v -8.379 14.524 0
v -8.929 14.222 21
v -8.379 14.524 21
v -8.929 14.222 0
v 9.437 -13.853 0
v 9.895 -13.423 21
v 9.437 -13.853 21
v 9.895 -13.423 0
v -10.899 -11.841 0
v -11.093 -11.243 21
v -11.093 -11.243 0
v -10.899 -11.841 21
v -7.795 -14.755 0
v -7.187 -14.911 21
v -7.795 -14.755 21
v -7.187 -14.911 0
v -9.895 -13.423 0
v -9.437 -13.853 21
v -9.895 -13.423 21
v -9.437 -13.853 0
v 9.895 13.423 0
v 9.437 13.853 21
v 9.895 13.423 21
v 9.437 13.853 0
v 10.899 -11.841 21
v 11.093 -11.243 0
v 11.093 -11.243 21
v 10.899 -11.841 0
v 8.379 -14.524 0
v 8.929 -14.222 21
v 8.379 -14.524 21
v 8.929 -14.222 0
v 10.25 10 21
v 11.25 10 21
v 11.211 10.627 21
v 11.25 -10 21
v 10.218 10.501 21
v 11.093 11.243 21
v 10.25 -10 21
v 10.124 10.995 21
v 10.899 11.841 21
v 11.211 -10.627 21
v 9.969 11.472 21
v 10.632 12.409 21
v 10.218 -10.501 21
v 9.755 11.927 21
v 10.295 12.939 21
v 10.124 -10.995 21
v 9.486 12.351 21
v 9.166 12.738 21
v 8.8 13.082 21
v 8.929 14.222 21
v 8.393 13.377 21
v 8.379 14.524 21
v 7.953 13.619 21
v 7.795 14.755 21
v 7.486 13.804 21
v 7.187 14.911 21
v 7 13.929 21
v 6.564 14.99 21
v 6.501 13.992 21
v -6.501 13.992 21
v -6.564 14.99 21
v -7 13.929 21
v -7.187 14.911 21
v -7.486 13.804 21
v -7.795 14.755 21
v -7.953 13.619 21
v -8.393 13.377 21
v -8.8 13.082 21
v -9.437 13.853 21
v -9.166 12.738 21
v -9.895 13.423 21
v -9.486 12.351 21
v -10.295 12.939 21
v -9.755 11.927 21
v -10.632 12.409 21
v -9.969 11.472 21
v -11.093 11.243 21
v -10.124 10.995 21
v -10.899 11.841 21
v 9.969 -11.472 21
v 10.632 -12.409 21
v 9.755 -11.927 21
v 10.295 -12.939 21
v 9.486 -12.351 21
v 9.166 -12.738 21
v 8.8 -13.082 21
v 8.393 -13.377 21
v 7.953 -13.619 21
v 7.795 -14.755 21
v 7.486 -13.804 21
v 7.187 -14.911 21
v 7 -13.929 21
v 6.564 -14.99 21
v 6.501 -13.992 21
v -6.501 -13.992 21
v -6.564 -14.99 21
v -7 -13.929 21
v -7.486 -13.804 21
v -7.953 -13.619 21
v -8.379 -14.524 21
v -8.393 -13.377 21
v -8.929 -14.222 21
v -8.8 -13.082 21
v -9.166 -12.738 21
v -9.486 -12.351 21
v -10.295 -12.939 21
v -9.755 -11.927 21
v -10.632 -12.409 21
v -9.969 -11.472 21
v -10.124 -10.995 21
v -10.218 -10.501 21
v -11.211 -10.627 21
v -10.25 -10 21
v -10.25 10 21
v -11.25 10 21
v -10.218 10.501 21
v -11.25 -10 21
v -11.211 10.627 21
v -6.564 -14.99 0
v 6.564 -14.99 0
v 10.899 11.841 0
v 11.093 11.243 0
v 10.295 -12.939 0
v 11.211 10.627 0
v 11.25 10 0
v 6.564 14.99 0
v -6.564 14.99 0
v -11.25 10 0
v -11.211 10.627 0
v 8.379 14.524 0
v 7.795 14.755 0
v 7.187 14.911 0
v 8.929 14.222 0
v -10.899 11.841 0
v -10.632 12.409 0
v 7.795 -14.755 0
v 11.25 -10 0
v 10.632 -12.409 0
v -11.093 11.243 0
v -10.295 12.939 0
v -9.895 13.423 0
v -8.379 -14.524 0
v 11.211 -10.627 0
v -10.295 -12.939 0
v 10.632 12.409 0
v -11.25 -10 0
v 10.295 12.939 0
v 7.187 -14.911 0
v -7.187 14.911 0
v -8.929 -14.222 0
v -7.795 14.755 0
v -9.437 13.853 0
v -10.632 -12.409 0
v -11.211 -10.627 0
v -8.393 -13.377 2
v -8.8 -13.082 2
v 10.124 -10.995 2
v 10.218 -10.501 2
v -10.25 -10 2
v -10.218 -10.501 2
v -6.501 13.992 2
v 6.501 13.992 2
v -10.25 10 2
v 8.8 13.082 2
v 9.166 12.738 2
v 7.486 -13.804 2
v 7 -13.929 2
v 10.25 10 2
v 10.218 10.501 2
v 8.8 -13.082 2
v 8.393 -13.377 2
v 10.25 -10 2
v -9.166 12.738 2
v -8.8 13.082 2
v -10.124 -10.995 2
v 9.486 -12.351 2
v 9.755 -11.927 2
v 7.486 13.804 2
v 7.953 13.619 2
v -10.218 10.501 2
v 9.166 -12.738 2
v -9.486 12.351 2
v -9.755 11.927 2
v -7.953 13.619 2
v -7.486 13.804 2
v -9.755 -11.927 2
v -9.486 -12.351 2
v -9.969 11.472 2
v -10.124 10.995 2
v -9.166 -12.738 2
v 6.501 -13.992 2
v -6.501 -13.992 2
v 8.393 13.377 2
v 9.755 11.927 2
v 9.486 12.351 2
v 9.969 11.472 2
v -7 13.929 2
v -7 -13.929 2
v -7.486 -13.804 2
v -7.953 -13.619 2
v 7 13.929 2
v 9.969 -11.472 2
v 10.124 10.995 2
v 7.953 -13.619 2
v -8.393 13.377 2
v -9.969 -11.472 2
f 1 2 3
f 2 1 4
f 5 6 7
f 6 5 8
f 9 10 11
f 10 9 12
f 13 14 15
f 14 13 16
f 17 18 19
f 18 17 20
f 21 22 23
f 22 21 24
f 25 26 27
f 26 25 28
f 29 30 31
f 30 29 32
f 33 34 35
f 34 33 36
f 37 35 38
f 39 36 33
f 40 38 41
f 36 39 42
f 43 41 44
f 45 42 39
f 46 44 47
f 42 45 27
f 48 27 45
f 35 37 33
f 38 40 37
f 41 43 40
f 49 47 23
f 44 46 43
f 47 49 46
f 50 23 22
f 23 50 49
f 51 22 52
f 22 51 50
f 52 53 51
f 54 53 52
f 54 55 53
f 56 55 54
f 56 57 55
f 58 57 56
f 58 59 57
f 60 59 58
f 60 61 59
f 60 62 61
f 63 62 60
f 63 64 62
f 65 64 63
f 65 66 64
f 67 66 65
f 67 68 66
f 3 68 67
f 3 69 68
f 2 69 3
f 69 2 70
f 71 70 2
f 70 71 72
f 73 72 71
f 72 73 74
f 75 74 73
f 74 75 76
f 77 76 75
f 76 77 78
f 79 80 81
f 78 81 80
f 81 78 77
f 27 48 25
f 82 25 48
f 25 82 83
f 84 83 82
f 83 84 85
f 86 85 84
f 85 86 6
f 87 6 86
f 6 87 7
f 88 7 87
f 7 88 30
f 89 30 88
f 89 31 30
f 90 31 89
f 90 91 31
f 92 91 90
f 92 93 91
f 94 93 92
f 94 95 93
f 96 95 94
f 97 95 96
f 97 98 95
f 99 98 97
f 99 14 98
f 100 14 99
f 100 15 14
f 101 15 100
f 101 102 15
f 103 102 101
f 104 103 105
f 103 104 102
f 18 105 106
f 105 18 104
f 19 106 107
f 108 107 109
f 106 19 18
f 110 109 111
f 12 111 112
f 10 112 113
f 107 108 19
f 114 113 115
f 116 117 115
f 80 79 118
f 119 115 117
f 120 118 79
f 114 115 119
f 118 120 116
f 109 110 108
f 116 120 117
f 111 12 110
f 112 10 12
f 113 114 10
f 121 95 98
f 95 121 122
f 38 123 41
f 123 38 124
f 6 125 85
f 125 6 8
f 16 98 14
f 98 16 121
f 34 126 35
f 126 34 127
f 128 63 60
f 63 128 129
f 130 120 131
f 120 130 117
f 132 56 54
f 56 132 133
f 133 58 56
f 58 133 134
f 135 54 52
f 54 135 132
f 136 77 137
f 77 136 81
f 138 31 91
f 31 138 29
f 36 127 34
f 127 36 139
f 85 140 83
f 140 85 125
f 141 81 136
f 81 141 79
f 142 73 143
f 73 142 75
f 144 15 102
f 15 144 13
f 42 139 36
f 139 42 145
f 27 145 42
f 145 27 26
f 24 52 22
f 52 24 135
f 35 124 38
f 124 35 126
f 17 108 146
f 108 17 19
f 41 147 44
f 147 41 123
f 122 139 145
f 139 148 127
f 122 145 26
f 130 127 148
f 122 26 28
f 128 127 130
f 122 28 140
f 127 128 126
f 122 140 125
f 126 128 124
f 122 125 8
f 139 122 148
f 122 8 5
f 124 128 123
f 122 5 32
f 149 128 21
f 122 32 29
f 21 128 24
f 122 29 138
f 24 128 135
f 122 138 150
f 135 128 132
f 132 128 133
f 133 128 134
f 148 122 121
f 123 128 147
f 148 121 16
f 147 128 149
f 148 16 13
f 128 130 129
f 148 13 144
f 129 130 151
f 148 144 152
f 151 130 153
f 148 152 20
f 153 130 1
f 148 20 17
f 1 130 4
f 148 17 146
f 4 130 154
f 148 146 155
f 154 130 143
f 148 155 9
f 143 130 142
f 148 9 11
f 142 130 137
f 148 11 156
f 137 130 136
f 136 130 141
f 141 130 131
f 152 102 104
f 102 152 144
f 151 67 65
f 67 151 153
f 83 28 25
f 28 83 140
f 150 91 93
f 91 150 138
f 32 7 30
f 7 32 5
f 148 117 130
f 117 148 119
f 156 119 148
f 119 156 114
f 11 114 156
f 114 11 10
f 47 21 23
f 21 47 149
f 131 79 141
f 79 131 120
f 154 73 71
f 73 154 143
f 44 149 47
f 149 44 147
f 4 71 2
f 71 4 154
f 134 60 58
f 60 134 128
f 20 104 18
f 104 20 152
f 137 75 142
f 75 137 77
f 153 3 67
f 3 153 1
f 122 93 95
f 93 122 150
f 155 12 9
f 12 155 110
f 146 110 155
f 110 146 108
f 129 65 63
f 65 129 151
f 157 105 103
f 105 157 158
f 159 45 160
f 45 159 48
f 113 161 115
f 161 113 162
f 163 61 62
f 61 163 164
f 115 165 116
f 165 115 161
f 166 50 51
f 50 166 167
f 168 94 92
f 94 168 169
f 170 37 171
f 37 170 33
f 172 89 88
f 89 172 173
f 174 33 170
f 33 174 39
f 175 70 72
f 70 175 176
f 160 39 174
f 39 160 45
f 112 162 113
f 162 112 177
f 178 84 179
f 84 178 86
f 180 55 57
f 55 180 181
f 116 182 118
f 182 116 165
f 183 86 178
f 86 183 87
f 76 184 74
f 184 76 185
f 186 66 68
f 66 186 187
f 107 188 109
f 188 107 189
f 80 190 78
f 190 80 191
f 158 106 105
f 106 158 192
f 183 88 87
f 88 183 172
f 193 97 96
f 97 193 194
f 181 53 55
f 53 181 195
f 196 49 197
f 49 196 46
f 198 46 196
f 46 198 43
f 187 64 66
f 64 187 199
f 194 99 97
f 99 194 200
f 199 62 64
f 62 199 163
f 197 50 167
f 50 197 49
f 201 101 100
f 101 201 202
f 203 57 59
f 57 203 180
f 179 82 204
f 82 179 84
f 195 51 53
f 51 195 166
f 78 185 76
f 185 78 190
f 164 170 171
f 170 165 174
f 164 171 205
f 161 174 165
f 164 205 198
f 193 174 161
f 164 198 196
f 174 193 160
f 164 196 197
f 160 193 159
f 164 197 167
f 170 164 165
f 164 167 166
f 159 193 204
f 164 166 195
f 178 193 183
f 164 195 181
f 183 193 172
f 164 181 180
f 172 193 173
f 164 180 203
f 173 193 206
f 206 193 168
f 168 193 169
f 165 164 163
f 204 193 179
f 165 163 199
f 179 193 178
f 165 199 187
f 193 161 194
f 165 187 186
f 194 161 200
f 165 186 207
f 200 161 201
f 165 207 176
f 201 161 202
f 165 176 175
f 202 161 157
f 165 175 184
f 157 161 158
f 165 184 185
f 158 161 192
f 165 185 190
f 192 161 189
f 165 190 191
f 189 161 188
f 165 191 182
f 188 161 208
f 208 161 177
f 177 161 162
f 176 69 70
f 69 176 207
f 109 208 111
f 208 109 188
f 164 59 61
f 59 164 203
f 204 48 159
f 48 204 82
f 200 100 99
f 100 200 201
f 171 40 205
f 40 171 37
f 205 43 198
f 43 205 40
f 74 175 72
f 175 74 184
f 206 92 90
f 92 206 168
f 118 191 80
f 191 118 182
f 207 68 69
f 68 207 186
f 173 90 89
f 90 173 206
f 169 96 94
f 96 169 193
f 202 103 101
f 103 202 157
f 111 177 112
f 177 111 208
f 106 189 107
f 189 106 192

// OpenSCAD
$fn = 50;


difference() {
	union() {
		hull() {
			translate(v = [-6.2500000000, 10.0000000000, 0]) {
				cylinder(h = 21, r = 5);
			}
			translate(v = [6.2500000000, 10.0000000000, 0]) {
				cylinder(h = 21, r = 5);
			}
			translate(v = [-6.2500000000, -10.0000000000, 0]) {
				cylinder(h = 21, r = 5);
			}
			translate(v = [6.2500000000, -10.0000000000, 0]) {
				cylinder(h = 21, r = 5);
			}
		}
	}
	union() {
		translate(v = [0, 0, 2]) {
			hull() {
				translate(v = [-6.2500000000, 10.0000000000, 0]) {
					cylinder(h = 19, r = 4);
				}
				translate(v = [6.2500000000, 10.0000000000, 0]) {
					cylinder(h = 19, r = 4);
				}
				translate(v = [-6.2500000000, -10.0000000000, 0]) {
					cylinder(h = 19, r = 4);
				}
				translate(v = [6.2500000000, -10.0000000000, 0]) {
					cylinder(h = 19, r = 4);
				}
			}
		}
	}
}
